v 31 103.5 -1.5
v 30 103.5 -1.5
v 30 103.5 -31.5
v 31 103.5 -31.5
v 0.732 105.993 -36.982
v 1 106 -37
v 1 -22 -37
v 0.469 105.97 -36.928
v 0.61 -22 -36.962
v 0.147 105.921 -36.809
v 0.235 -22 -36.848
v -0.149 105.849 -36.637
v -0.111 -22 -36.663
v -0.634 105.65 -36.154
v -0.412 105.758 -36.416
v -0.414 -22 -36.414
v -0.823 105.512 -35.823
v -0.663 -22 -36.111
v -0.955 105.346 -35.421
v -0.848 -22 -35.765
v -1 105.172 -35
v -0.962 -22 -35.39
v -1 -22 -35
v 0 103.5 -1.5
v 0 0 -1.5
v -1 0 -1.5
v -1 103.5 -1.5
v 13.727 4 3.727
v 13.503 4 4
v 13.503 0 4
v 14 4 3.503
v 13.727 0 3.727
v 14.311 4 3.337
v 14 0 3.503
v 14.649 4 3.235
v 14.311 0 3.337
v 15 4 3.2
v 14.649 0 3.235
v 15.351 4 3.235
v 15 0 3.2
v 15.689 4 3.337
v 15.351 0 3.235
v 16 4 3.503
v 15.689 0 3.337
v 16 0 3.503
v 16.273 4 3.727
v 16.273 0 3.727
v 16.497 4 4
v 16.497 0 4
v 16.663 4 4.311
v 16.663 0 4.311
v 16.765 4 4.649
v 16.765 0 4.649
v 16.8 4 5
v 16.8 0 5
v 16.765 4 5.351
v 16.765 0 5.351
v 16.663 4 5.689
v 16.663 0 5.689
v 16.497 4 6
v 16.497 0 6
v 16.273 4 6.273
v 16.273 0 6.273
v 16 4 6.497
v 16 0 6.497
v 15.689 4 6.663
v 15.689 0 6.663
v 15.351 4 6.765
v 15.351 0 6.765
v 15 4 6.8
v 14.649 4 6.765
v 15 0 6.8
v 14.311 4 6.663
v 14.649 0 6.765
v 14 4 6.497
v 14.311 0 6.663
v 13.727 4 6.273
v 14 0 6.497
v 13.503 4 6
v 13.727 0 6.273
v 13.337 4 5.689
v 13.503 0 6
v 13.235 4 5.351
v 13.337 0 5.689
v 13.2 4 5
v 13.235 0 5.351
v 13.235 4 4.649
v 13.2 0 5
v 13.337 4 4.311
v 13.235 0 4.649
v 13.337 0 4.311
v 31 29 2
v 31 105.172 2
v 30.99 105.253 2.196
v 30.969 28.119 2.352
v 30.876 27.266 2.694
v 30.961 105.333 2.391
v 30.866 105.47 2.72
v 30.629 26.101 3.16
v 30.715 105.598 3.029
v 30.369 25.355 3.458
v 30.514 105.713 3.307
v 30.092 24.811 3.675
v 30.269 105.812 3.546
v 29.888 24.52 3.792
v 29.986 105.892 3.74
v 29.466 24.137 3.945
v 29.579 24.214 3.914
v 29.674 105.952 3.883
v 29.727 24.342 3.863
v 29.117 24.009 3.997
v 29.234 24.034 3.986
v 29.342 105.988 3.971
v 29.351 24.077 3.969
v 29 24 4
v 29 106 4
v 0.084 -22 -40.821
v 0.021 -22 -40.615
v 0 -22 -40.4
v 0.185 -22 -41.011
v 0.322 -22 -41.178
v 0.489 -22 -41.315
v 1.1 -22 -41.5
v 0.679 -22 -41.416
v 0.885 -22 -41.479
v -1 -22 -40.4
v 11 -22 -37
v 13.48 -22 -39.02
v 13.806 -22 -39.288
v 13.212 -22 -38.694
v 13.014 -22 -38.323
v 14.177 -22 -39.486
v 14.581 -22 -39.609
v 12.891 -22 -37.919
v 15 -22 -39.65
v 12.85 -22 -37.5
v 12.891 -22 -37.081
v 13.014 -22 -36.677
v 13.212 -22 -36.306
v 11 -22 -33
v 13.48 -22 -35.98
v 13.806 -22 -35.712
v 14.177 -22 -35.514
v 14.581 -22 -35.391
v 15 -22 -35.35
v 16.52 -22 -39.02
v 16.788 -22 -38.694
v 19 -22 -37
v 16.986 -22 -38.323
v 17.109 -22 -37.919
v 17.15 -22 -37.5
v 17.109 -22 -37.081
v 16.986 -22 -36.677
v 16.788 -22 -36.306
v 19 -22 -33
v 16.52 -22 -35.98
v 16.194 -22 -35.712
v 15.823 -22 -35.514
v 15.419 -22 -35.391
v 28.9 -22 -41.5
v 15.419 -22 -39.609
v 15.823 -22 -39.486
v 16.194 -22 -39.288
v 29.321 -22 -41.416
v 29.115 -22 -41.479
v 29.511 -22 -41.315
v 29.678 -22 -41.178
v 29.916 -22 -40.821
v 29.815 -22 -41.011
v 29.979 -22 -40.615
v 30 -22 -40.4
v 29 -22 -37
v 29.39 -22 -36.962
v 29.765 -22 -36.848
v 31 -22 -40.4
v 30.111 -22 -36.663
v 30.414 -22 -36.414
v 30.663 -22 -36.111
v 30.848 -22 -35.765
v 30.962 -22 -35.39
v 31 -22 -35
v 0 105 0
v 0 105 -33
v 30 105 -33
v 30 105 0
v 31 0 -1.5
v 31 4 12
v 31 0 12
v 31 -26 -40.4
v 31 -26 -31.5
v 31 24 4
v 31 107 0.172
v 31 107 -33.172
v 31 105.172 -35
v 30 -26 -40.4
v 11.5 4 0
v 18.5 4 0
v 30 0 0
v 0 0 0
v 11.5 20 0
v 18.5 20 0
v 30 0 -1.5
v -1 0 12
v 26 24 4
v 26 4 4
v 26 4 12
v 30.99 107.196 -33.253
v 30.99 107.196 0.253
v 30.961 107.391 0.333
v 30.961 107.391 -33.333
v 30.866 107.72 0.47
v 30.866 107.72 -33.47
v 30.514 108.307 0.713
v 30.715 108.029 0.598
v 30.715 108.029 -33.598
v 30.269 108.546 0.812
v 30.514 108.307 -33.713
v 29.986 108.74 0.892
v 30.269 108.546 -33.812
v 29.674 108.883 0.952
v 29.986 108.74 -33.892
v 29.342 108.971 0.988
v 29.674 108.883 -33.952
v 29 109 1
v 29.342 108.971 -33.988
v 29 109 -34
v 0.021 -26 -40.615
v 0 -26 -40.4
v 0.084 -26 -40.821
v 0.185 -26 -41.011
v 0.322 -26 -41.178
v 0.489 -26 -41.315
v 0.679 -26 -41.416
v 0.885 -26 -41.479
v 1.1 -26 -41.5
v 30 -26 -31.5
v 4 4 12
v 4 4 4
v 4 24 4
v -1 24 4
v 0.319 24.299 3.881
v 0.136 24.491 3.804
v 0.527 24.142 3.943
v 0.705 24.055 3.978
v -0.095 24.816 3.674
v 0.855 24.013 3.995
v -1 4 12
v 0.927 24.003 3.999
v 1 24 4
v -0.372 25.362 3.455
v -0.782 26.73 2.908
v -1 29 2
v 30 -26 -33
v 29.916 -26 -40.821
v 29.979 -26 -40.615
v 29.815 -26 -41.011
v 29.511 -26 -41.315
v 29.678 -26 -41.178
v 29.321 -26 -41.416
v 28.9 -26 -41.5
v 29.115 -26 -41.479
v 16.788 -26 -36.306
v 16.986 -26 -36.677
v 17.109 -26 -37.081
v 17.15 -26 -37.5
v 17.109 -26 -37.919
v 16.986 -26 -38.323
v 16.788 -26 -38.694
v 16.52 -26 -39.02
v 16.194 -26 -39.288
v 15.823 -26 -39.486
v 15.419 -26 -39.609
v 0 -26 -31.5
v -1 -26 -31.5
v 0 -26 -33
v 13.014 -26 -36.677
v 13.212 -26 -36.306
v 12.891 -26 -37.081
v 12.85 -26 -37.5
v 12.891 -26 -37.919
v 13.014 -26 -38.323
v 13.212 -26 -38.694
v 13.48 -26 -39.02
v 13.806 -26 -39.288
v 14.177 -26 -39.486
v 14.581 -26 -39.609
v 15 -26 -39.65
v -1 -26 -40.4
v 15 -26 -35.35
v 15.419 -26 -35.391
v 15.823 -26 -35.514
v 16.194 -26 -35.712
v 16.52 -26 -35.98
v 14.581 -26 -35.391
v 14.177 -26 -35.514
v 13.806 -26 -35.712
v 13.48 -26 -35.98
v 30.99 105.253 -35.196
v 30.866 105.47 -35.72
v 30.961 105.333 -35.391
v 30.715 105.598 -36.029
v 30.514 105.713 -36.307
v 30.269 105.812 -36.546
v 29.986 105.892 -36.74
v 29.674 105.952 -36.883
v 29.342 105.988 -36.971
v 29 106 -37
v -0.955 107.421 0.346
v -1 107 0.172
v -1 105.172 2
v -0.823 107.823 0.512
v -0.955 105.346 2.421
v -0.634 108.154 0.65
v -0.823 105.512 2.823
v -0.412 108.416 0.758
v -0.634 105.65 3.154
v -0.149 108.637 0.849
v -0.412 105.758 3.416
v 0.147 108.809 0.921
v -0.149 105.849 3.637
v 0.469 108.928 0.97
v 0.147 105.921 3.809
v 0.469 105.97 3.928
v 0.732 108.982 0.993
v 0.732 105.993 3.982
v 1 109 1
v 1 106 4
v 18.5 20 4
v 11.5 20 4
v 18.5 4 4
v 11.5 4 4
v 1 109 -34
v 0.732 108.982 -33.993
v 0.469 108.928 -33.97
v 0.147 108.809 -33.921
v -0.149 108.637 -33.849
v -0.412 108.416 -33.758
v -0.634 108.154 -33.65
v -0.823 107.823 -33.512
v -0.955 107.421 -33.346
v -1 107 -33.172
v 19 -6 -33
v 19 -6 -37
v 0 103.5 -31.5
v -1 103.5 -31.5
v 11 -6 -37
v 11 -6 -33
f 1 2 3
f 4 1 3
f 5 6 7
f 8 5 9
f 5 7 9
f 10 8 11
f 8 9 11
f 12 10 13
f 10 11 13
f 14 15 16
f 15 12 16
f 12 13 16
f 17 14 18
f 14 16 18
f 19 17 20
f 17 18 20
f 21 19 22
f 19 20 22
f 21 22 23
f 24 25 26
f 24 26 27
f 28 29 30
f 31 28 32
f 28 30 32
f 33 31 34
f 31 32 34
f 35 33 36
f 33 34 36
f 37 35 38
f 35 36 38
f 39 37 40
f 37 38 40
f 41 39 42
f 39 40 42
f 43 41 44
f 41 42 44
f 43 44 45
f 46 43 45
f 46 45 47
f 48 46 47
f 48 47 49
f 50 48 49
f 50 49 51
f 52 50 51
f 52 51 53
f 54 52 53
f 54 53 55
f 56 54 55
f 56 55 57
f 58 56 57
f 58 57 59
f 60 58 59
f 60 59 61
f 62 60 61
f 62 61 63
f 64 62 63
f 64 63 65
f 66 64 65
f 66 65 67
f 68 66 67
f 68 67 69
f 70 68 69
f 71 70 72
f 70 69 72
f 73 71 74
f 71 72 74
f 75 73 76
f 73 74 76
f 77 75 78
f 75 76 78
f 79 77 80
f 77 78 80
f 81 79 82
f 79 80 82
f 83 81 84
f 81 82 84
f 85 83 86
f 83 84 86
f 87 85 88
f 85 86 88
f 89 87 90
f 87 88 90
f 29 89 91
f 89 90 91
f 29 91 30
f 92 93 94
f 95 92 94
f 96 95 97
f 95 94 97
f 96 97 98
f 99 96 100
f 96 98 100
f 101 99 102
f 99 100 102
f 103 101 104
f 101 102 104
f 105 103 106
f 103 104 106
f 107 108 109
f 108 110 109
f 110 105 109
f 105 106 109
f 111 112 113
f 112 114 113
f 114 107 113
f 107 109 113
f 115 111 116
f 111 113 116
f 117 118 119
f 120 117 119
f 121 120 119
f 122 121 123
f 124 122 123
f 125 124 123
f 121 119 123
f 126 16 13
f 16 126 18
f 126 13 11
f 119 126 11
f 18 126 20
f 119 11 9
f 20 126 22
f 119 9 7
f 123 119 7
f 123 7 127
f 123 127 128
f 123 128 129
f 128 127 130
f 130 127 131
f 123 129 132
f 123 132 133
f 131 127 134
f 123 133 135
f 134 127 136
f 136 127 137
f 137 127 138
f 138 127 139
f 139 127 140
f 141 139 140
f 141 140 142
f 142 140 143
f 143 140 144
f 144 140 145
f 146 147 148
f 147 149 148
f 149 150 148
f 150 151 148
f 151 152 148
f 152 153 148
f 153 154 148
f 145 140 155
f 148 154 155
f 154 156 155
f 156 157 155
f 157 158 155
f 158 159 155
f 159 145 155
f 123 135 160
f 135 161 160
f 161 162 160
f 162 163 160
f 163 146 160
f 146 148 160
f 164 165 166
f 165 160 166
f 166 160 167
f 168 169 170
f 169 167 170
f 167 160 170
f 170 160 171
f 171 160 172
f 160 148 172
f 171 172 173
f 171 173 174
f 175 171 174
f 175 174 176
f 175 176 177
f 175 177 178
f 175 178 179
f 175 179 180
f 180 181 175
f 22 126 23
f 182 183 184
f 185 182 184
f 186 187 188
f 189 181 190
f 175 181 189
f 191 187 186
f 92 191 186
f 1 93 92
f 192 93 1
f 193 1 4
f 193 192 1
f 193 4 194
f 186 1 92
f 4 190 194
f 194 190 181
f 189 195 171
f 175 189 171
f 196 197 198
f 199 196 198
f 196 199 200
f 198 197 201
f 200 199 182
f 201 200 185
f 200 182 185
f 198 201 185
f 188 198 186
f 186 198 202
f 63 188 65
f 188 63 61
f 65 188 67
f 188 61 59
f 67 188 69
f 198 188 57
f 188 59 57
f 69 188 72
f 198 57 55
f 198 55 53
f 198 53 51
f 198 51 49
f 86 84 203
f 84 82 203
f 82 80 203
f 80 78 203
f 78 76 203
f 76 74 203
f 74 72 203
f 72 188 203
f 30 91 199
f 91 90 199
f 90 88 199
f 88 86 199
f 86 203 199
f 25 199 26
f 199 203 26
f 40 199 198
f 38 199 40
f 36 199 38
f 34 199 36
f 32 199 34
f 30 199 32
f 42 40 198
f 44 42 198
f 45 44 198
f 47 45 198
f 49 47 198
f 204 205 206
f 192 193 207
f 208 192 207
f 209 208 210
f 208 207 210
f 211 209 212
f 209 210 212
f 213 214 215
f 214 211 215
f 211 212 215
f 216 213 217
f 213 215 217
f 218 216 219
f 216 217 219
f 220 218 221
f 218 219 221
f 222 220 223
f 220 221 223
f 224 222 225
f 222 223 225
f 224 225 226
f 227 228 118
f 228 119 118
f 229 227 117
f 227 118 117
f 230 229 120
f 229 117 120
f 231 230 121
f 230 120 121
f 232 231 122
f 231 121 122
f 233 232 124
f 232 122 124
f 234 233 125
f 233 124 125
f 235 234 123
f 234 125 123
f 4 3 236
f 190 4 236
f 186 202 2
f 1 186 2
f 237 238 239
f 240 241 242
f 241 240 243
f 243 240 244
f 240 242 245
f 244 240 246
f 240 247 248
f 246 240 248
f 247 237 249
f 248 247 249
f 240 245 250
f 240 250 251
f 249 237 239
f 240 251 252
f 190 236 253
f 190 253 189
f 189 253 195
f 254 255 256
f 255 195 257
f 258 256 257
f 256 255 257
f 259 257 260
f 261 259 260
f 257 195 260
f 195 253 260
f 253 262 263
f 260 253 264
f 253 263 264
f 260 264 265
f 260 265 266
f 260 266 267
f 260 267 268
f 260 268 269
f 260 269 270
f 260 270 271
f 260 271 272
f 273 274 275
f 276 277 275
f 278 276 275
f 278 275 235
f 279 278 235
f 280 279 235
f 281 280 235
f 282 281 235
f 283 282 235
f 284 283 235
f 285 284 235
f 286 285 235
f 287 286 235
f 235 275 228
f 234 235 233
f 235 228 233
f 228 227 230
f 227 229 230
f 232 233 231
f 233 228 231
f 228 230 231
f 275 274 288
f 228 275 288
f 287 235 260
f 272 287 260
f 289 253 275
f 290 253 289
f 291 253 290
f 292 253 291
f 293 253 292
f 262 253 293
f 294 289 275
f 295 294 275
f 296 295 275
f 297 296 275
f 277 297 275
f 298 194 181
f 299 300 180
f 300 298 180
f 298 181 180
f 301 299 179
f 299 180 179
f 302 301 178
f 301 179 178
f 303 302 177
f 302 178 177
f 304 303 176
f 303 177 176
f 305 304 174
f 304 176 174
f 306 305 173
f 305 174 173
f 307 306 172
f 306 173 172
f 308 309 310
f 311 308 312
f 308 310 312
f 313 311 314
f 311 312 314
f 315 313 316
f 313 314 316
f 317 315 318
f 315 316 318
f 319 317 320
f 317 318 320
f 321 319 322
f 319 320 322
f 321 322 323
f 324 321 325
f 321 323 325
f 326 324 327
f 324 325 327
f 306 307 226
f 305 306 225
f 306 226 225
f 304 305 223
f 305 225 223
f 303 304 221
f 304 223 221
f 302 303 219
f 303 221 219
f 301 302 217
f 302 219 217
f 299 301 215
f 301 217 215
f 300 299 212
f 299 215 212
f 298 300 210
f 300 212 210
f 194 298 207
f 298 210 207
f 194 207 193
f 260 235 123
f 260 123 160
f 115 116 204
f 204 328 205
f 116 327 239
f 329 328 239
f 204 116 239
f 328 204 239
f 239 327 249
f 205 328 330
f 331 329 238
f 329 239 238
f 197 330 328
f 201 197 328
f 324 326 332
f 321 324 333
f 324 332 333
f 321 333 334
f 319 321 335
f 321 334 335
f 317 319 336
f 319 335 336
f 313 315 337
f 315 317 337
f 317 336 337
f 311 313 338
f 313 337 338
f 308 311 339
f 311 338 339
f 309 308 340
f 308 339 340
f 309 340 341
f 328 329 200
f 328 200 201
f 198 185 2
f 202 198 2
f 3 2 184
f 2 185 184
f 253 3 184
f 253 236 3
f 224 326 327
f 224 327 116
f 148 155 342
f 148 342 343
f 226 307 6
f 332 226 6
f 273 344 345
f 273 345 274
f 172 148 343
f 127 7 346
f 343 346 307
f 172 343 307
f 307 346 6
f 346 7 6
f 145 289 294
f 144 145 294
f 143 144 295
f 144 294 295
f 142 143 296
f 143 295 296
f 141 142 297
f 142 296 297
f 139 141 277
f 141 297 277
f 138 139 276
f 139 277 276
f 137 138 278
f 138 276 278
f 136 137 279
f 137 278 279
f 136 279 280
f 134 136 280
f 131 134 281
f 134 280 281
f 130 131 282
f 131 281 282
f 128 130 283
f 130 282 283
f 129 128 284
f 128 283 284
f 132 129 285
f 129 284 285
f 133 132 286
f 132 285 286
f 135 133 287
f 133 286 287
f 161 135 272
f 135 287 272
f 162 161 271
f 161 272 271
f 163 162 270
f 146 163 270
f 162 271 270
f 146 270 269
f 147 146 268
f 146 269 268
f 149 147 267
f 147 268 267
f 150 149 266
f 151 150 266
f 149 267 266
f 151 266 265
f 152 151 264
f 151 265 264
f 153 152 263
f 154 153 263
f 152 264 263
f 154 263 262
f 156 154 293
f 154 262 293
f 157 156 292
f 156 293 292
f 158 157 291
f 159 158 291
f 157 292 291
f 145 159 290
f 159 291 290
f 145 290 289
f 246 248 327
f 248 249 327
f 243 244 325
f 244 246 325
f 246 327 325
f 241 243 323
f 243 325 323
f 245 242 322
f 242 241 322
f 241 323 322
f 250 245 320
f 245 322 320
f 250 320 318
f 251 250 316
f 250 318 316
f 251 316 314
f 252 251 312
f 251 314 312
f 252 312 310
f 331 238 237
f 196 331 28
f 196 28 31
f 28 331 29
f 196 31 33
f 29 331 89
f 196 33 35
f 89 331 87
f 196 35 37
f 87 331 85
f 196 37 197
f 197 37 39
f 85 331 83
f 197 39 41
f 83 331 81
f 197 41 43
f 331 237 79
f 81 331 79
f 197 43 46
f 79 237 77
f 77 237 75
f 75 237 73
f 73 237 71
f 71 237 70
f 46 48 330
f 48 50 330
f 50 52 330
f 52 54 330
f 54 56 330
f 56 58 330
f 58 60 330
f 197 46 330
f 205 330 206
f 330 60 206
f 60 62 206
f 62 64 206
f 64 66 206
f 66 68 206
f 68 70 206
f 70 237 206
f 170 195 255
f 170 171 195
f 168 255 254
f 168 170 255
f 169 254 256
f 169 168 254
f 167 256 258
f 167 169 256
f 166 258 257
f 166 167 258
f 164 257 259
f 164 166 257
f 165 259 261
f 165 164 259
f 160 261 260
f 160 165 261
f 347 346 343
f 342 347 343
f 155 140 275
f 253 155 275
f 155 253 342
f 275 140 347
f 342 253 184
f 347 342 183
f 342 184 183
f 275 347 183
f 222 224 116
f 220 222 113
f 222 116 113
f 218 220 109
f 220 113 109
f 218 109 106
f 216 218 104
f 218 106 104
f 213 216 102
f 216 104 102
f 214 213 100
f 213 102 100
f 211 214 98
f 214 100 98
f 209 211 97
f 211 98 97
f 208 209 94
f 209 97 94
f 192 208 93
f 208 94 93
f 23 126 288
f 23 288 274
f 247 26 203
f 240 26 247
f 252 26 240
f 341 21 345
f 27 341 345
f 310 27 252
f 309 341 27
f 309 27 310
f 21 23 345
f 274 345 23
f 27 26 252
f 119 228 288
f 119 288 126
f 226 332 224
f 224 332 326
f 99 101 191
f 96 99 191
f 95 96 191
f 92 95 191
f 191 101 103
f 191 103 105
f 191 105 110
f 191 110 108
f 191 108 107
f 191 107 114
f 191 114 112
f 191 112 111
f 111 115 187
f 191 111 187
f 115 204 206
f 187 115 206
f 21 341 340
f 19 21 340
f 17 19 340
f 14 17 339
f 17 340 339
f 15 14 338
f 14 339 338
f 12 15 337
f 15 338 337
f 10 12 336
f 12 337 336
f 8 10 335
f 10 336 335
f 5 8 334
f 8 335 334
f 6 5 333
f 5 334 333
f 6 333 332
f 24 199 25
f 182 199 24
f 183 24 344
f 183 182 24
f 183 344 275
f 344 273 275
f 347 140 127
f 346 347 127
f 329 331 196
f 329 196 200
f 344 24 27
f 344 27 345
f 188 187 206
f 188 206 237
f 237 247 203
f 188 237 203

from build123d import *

# Parameters (mm, degrees)
SKETCH1_W            = 30
SKETCH1_H            = 105
BOSS_EXTRUDE1_DEPTH  = 4
SKETCH2_W            = 30
SKETCH2_H            = 12
SKETCH2_R            = 1.8
BOSS_EXTRUDE2_DEPTH  = 4
SKETCH3_W            = 7
SKETCH3_H            = 16
CUT_EXTRUDE1_DEPTH   = 110.494292089
BOSS_EXTRUDE3_DEPTH  = 4
BOSS_EXTRUDE4_START  = -30
BOSS_EXTRUDE4_DEPTH  = 4
SKETCH5_W            = 30
SKETCH5_H            = 41
BOSS_EXTRUDE5_DEPTH  = 4
SKETCH6_W            = 30
SKETCH6_H            = 135
BOSS_EXTRUDE6_DEPTH  = 4
SKETCH7_W            = 30
SKETCH7_H            = 8.5
BOSS_EXTRUDE7_DEPTH  = 4
FILLET1_R            = 1.1
SKETCH10_W           = 2.15
SKETCH10_H           = 4
SKETCH11_W           = 8
SKETCH11_H           = 8.5
CUT_EXTRUDE2_DEPTH   = 16
SKETCH14_W           = 1.8
SKETCH14_H           = 30
BOSS_EXTRUDE8_DEPTH  = 1
SKETCH16_W           = 3.4
SKETCH16_H           = 4
BOSS_EXTRUDE10_DEPTH = 1
BOSS_EXTRUDE9_START  = -30
BOSS_EXTRUDE9_DEPTH  = 1
SKETCH17_W           = 3.4
SKETCH17_H           = 4
BOSS_EXTRUDE11_DEPTH = 1
CHAMFER1_SIZE        = 3
FILLET2_R            = 2


with BuildPart() as part:
    # Sketch1 → Boss-Extrude1 (new body)
    with BuildSketch(Plane.XY):
        with Locations((15, 52.5)):
            Rectangle(SKETCH1_W, SKETCH1_H)
    extrude(amount=BOSS_EXTRUDE1_DEPTH)

    # Sketch2 → Boss-Extrude2 (add)
    with BuildSketch(Plane.XZ):
        with Locations((15, 6)):
            Rectangle(SKETCH2_W, SKETCH2_H)
        with Locations((15, 5)):
            Circle(SKETCH2_R, mode=Mode.SUBTRACT)
    extrude(amount=-BOSS_EXTRUDE2_DEPTH)

    # Sketch3 → Cut-Extrude1 (cut, through all)
    with BuildSketch(Plane.XY.offset(4)):
        with Locations((15, 12)):
            Rectangle(SKETCH3_W, SKETCH3_H)
    extrude(amount=-CUT_EXTRUDE1_DEPTH, mode=Mode.SUBTRACT)

    # Sketch4 → Boss-Extrude3 (add)
    with BuildSketch(Plane.ZY):
        Polygon((12, 4), (0, 34), (0, 4), align=None)
    extrude(amount=-BOSS_EXTRUDE3_DEPTH)

    # Sketch4<2> → Boss-Extrude4 (add)
    with BuildSketch(Plane.ZY.offset(BOSS_EXTRUDE4_START)):
        Polygon((12, 4), (0, 34), (0, 4), align=None)
    extrude(amount=BOSS_EXTRUDE4_DEPTH)

    # Sketch5 → Boss-Extrude5 (add)
    with BuildSketch(Plane(origin=(0, 105, 0), x_dir=(1, 0, 0), z_dir=(0, 1, 0))):
        with Locations((15, 16.5)):
            Rectangle(SKETCH5_W, SKETCH5_H)
    extrude(amount=BOSS_EXTRUDE5_DEPTH)

    # Sketch6 → Boss-Extrude6 (add)
    with BuildSketch(Plane(origin=(0, 0, -37), x_dir=(-1, 0, 0), z_dir=(0, 0, -1))):
        with Locations((-15, 41.5)):
            Rectangle(SKETCH6_W, SKETCH6_H)
    extrude(amount=-BOSS_EXTRUDE6_DEPTH)

    # Sketch7 → Boss-Extrude7 (add)
    with BuildSketch(Plane.XZ.offset(26)):
        with Locations((15, -37.25)):
            Rectangle(SKETCH7_W, SKETCH7_H)
    extrude(amount=-BOSS_EXTRUDE7_DEPTH)

    # Fillet1
    fillet1_edges = [part.edges().sort_by_distance(p)[0] for p in [
        (0, -24, -41.5),
        (30, -24, -41.5),
    ]]
    fillet(fillet1_edges, radius=FILLET1_R)

    # Sketch10 → Ø4.3 (4.3) Diameter Hole1 (revolve, cut)
    with BuildSketch(Plane(origin=(15, -22, -37.5), x_dir=(0, 0, 1), z_dir=(1, 0, 0))):
        with Locations((1.075, 2)):
            Rectangle(SKETCH10_W, SKETCH10_H)
    revolve(axis=Axis((15, -15.65, -37.5), (0, -1, 0)), mode=Mode.SUBTRACT)

    # Sketch11 → Cut-Extrude2 (cut)
    with BuildSketch(Plane(origin=(0, -22, 0), x_dir=(1, 0, 0), z_dir=(0, 1, 0))):
        with Locations((15, 37.25)):
            Rectangle(SKETCH11_W, SKETCH11_H)
    extrude(amount=CUT_EXTRUDE2_DEPTH, mode=Mode.SUBTRACT)

    # Sketch14 → Ø3.6 (3.6) Diameter Hole1 (revolve, cut)
    with BuildSketch(Plane(origin=(15, 4, 5), x_dir=(0, 0, 1), z_dir=(1, 0, 0))):
        with Locations((0.9, 15)):
            Rectangle(SKETCH14_W, SKETCH14_H)
    revolve(axis=Axis((15, 10.35, 5), (0, -1, 0)), mode=Mode.SUBTRACT)

    # Sketch15 → Boss-Extrude8 (add)
    with BuildSketch(Plane.ZY):
        Polygon((-37, 109), (4, 109), (4, 0), (-1.5, 0), (-1.5, 103.5), (-31.5, 103.5), (-31.5, -26), (-37, -26), align=None)
    extrude(amount=BOSS_EXTRUDE8_DEPTH)

    # Sketch16 → Boss-Extrude10 (add)
    with BuildSketch(Plane.ZY):
        Polygon((4, 24), (4, 0), (12, 0), (12, 4), align=None)
        with Locations((-38.7, -24)):
            Rectangle(SKETCH16_W, SKETCH16_H)
    extrude(amount=BOSS_EXTRUDE10_DEPTH)

    # Sketch15<2> → Boss-Extrude9 (add)
    with BuildSketch(Plane.ZY.offset(BOSS_EXTRUDE9_START)):
        Polygon((-37, 109), (4, 109), (4, 0), (-1.5, 0), (-1.5, 103.5), (-31.5, 103.5), (-31.5, -26), (-37, -26), align=None)
    extrude(amount=-BOSS_EXTRUDE9_DEPTH)

    # Sketch17 → Boss-Extrude11 (add)
    with BuildSketch(Plane(origin=(30, 0, 0), x_dir=(0, 0, -1), z_dir=(1, 0, 0))):
        Polygon((-12, 0), (-4, 0), (-4, 24), (-12, 4), align=None)
        with Locations((38.7, -24)):
            Rectangle(SKETCH17_W, SKETCH17_H)
    extrude(amount=BOSS_EXTRUDE11_DEPTH)

    # Chamfer1
    chamfer1_edges = [part.edges().sort_by_distance(p)[0] for p in [
        (15, 109, 4),
        (15, 109, -37),
    ]]
    chamfer(chamfer1_edges, length=CHAMFER1_SIZE)

    # Fillet2
    # the kernel refuses this fillet: 2 mm, written as the material it takes off along each edge
    with BuildSketch(Plane(origin=(-1, 111, 4), x_dir=(1, 0, 0), z_dir=(0, -1, 0))) as fillet2_piece_1_section:
        with BuildLine():
            CenterArc((FILLET2_R, -FILLET2_R), FILLET2_R, 90, 90)
            Line((0, -FILLET2_R), (0, 0))
            Line((0, 0), (FILLET2_R, 0))
        make_face()
    fillet2_piece_1 = extrude(amount=92, mode=Mode.PRIVATE)
    fillet2_piece_1 = split(fillet2_piece_1, bisect_by=Plane(origin=(-0.544012224, 62.136356158, -11.254542463), z_dir=(0, 0.3713906763541038, 0.9284766908852594)), keep=Keep.TOP, mode=Mode.PRIVATE)
    add(fillet2_piece_1, mode=Mode.SUBTRACT)
    with BuildSketch(Plane(origin=(31, 111, 4), x_dir=(-1, 0, 0), z_dir=(0, -1, 0))) as fillet2_piece_2_section:
        with BuildLine():
            CenterArc((FILLET2_R, FILLET2_R), FILLET2_R, 180, 90)
            Line((0, FILLET2_R), (0, 0))
            Line((0, 0), (FILLET2_R, 0))
        make_face()
    fillet2_piece_2 = extrude(amount=92, mode=Mode.PRIVATE)
    fillet2_piece_2 = split(fillet2_piece_2, bisect_by=Plane(origin=(30.544012224, 62.136356158, -11.254542463), z_dir=(0, 0.37139067635410367, 0.9284766908852594)), keep=Keep.TOP, mode=Mode.PRIVATE)
    add(fillet2_piece_2, mode=Mode.SUBTRACT)
    with BuildSketch(Plane(origin=(-1, 109, -39), x_dir=(0, -1, 0), z_dir=(0, 0, 1))) as fillet2_piece_3:
        with BuildLine():
            CenterArc((FILLET2_R, FILLET2_R), FILLET2_R, 180, 90)
            Line((0, FILLET2_R), (0, 0))
            Line((0, 0), (FILLET2_R, 0))
        make_face()
    extrude(amount=45, mode=Mode.SUBTRACT)
    with BuildSketch(Plane(origin=(31, 109, -39), x_dir=(0, -1, 0), z_dir=(0, 0, 1))) as fillet2_piece_4:
        with BuildLine():
            CenterArc((FILLET2_R, -FILLET2_R), FILLET2_R, 90, 90)
            Line((0, -FILLET2_R), (0, 0))
            Line((0, 0), (FILLET2_R, 0))
        make_face()
    extrude(amount=45, mode=Mode.SUBTRACT)
    with BuildSketch(Plane(origin=(-1, -22, -37), x_dir=(0, 0, 1), z_dir=(0, 1, 0))) as fillet2_piece_5:
        with BuildLine():
            CenterArc((FILLET2_R, FILLET2_R), FILLET2_R, 180, 90)
            Line((0, FILLET2_R), (0, 0))
            Line((0, 0), (FILLET2_R, 0))
        make_face()
    extrude(amount=133, mode=Mode.SUBTRACT)
    with BuildSketch(Plane(origin=(-1, 102.464466094, 7.535533906), x_dir=(0, -0.7071067811865476, -0.7071067811865476), z_dir=(0, 0.7071067811865476, -0.7071067811865476)), Plane(origin=(-1, 112.535533906, -30.464466094), x_dir=(0, -0.7071067811865476, 0.7071067811865476), z_dir=(0, -0.7071067811865476, -0.7071067811865476)), Plane(origin=(31, 102.464466094, 7.535533906), x_dir=(-1, 0, 0), z_dir=(0, 0.7071067811865476, -0.7071067811865476))) as fillet2_piece_6:
        with BuildLine():
            CenterArc((FILLET2_R, -FILLET2_R), FILLET2_R, 90, 90)
            Line((0, -FILLET2_R), (0, 0))
            Line((0, 0), (FILLET2_R, 0))
        make_face()
    extrude(amount=14.242640687, mode=Mode.SUBTRACT)
    with BuildSketch(Plane(origin=(31, -22, -37), x_dir=(0, 0, 1), z_dir=(0, 1, 0))) as fillet2_piece_7:
        with BuildLine():
            CenterArc((FILLET2_R, -FILLET2_R), FILLET2_R, 90, 90)
            Line((0, -FILLET2_R), (0, 0))
            Line((0, 0), (FILLET2_R, 0))
        make_face()
    extrude(amount=133, mode=Mode.SUBTRACT)
    with BuildSketch(Plane(origin=(31, 112.535533906, -30.464466094), x_dir=(0, -0.7071067811865476, 0.7071067811865476), z_dir=(0, -0.7071067811865476, -0.7071067811865476))) as fillet2_piece_8:
        with BuildLine():
            CenterArc((FILLET2_R, FILLET2_R), FILLET2_R, 180, 90)
            Line((0, FILLET2_R), (0, 0))
            Line((0, 0), (FILLET2_R, 0))
        make_face()
    extrude(amount=14.242640687, mode=Mode.SUBTRACT)


solid = part.part
